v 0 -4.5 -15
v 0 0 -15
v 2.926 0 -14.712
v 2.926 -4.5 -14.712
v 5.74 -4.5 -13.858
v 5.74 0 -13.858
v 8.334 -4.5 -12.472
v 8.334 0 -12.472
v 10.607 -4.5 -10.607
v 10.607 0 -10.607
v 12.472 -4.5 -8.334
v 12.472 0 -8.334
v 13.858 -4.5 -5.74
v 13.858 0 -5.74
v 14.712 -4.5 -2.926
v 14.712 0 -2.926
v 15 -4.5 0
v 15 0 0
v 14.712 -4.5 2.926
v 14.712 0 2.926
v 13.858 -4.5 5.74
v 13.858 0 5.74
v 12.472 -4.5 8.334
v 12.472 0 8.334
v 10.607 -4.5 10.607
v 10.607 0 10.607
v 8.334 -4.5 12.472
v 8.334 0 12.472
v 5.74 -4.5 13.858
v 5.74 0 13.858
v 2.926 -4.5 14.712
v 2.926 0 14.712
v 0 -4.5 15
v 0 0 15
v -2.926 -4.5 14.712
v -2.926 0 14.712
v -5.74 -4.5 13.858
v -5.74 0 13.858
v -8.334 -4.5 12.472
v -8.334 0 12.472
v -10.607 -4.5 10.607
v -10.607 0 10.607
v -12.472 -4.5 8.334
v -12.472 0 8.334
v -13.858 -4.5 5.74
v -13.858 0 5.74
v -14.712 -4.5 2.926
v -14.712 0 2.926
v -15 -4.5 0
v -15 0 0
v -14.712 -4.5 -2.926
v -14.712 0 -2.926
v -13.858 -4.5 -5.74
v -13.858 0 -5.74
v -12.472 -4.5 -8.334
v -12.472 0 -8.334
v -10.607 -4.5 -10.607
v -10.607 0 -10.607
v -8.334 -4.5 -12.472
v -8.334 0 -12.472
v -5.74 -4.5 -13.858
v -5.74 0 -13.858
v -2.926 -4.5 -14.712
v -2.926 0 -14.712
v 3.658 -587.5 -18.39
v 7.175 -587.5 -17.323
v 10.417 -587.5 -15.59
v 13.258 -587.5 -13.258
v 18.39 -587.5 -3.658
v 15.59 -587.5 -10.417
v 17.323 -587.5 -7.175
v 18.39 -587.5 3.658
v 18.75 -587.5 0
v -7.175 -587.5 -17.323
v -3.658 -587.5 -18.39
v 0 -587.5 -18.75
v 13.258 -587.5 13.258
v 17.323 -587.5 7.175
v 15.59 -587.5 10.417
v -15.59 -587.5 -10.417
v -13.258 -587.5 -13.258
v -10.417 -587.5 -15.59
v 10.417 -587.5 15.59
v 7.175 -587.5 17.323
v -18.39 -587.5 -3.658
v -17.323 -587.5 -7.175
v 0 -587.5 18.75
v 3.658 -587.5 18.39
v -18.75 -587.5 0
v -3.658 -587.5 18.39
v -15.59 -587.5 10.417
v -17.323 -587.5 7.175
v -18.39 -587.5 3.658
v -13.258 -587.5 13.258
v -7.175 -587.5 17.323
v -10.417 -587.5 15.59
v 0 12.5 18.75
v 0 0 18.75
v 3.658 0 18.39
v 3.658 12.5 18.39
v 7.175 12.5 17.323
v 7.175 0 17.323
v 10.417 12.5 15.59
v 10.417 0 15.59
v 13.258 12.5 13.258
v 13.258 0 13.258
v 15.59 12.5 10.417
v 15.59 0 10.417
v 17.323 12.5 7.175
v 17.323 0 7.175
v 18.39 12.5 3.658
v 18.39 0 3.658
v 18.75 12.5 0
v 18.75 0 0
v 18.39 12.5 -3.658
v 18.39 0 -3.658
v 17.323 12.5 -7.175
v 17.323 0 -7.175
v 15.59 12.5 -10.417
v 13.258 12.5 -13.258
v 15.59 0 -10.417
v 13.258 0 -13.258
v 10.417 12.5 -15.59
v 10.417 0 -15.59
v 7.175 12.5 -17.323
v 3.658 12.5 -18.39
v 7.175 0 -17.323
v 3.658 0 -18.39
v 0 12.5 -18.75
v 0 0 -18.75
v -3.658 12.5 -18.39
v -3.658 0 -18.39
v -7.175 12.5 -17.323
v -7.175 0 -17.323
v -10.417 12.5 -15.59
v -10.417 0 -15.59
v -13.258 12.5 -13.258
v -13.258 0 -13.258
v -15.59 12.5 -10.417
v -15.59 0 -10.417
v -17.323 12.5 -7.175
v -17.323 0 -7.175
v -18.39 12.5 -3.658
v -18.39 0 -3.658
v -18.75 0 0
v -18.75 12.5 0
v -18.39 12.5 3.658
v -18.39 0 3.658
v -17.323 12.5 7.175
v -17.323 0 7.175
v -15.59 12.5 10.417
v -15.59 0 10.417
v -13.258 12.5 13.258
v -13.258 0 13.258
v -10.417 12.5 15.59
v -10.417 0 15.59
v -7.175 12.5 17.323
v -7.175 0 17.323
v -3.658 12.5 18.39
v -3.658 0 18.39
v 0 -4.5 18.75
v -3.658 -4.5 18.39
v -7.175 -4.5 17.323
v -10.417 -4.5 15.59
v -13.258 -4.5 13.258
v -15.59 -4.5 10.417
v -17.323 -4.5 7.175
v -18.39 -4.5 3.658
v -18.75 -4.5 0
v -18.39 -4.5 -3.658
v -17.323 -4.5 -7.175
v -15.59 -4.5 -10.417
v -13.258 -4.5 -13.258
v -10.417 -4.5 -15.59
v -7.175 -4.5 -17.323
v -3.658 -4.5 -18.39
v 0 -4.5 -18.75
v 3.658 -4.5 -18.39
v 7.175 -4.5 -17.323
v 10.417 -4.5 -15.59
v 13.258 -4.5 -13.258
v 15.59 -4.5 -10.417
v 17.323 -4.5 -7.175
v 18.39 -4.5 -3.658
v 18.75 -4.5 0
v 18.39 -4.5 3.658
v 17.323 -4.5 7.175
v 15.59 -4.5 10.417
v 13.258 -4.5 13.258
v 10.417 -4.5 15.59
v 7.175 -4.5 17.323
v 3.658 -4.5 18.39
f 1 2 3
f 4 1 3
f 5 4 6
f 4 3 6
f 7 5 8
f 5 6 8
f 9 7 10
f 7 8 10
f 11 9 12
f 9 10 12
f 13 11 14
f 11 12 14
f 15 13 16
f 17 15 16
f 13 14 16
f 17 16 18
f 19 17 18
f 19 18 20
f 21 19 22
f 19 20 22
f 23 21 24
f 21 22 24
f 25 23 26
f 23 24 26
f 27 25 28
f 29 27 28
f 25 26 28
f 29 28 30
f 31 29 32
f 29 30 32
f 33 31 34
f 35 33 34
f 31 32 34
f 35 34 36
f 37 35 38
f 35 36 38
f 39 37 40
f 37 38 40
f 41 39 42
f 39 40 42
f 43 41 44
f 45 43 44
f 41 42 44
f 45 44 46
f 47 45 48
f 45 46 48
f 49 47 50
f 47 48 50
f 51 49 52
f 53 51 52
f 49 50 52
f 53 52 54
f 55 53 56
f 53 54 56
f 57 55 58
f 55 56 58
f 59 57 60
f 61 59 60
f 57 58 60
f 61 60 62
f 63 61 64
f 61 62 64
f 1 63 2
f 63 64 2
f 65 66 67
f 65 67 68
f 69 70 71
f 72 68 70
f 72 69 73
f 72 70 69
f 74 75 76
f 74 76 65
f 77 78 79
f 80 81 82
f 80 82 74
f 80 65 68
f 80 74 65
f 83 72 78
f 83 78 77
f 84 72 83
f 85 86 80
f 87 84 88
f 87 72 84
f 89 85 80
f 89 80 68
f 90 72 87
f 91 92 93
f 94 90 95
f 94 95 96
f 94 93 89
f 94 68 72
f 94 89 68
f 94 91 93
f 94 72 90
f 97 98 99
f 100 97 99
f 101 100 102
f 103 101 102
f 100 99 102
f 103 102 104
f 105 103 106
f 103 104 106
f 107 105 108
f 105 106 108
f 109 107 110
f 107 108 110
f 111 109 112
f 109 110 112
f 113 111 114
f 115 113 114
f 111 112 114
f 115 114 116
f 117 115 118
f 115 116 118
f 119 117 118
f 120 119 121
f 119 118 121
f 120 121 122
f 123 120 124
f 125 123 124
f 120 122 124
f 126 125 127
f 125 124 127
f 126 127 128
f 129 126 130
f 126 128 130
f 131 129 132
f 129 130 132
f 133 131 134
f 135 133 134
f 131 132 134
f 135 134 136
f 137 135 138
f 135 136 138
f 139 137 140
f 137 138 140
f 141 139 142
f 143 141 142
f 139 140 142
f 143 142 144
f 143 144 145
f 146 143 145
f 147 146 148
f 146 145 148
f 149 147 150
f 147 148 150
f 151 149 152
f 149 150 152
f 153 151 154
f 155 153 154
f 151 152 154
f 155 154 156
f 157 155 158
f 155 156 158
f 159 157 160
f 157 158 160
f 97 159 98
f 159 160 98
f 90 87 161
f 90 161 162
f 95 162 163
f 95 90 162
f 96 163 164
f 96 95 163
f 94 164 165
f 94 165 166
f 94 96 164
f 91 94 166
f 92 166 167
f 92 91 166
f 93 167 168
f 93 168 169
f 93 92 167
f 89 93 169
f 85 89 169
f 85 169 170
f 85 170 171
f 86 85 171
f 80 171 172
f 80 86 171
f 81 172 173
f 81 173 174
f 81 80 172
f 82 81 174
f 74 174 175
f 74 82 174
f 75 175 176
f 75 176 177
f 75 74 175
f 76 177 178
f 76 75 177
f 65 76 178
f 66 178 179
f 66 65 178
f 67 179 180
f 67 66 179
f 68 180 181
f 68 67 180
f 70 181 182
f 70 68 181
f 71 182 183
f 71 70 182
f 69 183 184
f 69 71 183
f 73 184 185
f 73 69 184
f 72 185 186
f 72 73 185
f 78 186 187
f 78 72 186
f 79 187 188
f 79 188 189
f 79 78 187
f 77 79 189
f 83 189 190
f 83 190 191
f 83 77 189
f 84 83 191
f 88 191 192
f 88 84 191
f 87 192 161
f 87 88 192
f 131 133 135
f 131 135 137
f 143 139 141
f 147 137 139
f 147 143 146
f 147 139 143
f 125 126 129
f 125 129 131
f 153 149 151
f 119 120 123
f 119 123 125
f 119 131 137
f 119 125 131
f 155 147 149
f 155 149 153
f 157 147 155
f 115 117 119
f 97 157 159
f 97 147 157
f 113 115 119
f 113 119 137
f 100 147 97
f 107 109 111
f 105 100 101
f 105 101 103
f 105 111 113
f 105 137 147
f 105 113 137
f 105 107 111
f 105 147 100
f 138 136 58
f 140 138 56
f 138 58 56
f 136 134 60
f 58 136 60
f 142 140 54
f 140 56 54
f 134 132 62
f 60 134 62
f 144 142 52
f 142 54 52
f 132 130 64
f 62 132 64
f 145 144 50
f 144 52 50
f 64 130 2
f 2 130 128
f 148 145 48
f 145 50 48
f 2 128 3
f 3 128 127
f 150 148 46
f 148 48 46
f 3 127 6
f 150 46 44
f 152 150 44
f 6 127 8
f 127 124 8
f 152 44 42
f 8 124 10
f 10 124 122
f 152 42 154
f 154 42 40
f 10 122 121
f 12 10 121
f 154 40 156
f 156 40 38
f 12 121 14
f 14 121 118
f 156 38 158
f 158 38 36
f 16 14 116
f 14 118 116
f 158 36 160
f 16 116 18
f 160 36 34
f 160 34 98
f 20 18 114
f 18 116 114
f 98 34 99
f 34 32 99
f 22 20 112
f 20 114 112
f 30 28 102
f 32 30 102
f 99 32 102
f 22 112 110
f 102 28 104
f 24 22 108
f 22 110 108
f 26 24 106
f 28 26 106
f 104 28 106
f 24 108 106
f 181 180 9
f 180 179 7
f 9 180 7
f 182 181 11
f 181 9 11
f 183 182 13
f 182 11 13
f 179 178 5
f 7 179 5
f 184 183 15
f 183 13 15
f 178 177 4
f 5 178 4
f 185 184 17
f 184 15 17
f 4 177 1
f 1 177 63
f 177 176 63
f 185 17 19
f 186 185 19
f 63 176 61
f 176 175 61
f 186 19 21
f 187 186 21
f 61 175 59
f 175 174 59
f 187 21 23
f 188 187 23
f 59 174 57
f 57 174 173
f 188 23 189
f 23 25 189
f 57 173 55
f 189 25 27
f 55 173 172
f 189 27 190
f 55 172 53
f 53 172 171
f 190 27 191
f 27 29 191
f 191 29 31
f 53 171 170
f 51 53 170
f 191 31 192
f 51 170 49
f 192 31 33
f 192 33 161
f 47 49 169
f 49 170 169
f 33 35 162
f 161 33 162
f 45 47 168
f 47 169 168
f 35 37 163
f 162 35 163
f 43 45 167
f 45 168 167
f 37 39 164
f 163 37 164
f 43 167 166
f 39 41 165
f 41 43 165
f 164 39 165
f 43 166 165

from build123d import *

# Parameters (mm, degrees)
SKETCH1_R           = 18.75
BOSS_EXTRUDE1_DEPTH = 12.5
SKETCH2_R           = 15
BOSS_EXTRUDE2_DEPTH = 4.5
BOSS_EXTRUDE3_START = 583
SKETCH3_R           = 18.75
BOSS_EXTRUDE3_DEPTH = 583


with BuildPart() as part:
    # Sketch1 → Boss-Extrude1 (new body)
    with BuildSketch(Plane(origin=(0, 0, 0), x_dir=(1, 0, 0), z_dir=(0, 1, 0))):
        with Locations(Location((0, 0, 0), (0, 0, 270))):
            Circle(SKETCH1_R)
    extrude(amount=BOSS_EXTRUDE1_DEPTH)

    # Sketch2 → Boss-Extrude2 (add)
    with BuildSketch(Plane.XZ):
        with Locations(Location((0, 0, 0), (0, 0, 270))):
            Circle(SKETCH2_R)
    extrude(amount=BOSS_EXTRUDE2_DEPTH)

    # Sketch3 → Boss-Extrude3 (add)
    with BuildSketch(Plane.XZ.offset(4.5).offset(BOSS_EXTRUDE3_START)):
        with Locations(Location((0, 0, 0), (0, 0, 90))):
            Circle(SKETCH3_R)
    extrude(amount=-BOSS_EXTRUDE3_DEPTH)


solid = part.part
